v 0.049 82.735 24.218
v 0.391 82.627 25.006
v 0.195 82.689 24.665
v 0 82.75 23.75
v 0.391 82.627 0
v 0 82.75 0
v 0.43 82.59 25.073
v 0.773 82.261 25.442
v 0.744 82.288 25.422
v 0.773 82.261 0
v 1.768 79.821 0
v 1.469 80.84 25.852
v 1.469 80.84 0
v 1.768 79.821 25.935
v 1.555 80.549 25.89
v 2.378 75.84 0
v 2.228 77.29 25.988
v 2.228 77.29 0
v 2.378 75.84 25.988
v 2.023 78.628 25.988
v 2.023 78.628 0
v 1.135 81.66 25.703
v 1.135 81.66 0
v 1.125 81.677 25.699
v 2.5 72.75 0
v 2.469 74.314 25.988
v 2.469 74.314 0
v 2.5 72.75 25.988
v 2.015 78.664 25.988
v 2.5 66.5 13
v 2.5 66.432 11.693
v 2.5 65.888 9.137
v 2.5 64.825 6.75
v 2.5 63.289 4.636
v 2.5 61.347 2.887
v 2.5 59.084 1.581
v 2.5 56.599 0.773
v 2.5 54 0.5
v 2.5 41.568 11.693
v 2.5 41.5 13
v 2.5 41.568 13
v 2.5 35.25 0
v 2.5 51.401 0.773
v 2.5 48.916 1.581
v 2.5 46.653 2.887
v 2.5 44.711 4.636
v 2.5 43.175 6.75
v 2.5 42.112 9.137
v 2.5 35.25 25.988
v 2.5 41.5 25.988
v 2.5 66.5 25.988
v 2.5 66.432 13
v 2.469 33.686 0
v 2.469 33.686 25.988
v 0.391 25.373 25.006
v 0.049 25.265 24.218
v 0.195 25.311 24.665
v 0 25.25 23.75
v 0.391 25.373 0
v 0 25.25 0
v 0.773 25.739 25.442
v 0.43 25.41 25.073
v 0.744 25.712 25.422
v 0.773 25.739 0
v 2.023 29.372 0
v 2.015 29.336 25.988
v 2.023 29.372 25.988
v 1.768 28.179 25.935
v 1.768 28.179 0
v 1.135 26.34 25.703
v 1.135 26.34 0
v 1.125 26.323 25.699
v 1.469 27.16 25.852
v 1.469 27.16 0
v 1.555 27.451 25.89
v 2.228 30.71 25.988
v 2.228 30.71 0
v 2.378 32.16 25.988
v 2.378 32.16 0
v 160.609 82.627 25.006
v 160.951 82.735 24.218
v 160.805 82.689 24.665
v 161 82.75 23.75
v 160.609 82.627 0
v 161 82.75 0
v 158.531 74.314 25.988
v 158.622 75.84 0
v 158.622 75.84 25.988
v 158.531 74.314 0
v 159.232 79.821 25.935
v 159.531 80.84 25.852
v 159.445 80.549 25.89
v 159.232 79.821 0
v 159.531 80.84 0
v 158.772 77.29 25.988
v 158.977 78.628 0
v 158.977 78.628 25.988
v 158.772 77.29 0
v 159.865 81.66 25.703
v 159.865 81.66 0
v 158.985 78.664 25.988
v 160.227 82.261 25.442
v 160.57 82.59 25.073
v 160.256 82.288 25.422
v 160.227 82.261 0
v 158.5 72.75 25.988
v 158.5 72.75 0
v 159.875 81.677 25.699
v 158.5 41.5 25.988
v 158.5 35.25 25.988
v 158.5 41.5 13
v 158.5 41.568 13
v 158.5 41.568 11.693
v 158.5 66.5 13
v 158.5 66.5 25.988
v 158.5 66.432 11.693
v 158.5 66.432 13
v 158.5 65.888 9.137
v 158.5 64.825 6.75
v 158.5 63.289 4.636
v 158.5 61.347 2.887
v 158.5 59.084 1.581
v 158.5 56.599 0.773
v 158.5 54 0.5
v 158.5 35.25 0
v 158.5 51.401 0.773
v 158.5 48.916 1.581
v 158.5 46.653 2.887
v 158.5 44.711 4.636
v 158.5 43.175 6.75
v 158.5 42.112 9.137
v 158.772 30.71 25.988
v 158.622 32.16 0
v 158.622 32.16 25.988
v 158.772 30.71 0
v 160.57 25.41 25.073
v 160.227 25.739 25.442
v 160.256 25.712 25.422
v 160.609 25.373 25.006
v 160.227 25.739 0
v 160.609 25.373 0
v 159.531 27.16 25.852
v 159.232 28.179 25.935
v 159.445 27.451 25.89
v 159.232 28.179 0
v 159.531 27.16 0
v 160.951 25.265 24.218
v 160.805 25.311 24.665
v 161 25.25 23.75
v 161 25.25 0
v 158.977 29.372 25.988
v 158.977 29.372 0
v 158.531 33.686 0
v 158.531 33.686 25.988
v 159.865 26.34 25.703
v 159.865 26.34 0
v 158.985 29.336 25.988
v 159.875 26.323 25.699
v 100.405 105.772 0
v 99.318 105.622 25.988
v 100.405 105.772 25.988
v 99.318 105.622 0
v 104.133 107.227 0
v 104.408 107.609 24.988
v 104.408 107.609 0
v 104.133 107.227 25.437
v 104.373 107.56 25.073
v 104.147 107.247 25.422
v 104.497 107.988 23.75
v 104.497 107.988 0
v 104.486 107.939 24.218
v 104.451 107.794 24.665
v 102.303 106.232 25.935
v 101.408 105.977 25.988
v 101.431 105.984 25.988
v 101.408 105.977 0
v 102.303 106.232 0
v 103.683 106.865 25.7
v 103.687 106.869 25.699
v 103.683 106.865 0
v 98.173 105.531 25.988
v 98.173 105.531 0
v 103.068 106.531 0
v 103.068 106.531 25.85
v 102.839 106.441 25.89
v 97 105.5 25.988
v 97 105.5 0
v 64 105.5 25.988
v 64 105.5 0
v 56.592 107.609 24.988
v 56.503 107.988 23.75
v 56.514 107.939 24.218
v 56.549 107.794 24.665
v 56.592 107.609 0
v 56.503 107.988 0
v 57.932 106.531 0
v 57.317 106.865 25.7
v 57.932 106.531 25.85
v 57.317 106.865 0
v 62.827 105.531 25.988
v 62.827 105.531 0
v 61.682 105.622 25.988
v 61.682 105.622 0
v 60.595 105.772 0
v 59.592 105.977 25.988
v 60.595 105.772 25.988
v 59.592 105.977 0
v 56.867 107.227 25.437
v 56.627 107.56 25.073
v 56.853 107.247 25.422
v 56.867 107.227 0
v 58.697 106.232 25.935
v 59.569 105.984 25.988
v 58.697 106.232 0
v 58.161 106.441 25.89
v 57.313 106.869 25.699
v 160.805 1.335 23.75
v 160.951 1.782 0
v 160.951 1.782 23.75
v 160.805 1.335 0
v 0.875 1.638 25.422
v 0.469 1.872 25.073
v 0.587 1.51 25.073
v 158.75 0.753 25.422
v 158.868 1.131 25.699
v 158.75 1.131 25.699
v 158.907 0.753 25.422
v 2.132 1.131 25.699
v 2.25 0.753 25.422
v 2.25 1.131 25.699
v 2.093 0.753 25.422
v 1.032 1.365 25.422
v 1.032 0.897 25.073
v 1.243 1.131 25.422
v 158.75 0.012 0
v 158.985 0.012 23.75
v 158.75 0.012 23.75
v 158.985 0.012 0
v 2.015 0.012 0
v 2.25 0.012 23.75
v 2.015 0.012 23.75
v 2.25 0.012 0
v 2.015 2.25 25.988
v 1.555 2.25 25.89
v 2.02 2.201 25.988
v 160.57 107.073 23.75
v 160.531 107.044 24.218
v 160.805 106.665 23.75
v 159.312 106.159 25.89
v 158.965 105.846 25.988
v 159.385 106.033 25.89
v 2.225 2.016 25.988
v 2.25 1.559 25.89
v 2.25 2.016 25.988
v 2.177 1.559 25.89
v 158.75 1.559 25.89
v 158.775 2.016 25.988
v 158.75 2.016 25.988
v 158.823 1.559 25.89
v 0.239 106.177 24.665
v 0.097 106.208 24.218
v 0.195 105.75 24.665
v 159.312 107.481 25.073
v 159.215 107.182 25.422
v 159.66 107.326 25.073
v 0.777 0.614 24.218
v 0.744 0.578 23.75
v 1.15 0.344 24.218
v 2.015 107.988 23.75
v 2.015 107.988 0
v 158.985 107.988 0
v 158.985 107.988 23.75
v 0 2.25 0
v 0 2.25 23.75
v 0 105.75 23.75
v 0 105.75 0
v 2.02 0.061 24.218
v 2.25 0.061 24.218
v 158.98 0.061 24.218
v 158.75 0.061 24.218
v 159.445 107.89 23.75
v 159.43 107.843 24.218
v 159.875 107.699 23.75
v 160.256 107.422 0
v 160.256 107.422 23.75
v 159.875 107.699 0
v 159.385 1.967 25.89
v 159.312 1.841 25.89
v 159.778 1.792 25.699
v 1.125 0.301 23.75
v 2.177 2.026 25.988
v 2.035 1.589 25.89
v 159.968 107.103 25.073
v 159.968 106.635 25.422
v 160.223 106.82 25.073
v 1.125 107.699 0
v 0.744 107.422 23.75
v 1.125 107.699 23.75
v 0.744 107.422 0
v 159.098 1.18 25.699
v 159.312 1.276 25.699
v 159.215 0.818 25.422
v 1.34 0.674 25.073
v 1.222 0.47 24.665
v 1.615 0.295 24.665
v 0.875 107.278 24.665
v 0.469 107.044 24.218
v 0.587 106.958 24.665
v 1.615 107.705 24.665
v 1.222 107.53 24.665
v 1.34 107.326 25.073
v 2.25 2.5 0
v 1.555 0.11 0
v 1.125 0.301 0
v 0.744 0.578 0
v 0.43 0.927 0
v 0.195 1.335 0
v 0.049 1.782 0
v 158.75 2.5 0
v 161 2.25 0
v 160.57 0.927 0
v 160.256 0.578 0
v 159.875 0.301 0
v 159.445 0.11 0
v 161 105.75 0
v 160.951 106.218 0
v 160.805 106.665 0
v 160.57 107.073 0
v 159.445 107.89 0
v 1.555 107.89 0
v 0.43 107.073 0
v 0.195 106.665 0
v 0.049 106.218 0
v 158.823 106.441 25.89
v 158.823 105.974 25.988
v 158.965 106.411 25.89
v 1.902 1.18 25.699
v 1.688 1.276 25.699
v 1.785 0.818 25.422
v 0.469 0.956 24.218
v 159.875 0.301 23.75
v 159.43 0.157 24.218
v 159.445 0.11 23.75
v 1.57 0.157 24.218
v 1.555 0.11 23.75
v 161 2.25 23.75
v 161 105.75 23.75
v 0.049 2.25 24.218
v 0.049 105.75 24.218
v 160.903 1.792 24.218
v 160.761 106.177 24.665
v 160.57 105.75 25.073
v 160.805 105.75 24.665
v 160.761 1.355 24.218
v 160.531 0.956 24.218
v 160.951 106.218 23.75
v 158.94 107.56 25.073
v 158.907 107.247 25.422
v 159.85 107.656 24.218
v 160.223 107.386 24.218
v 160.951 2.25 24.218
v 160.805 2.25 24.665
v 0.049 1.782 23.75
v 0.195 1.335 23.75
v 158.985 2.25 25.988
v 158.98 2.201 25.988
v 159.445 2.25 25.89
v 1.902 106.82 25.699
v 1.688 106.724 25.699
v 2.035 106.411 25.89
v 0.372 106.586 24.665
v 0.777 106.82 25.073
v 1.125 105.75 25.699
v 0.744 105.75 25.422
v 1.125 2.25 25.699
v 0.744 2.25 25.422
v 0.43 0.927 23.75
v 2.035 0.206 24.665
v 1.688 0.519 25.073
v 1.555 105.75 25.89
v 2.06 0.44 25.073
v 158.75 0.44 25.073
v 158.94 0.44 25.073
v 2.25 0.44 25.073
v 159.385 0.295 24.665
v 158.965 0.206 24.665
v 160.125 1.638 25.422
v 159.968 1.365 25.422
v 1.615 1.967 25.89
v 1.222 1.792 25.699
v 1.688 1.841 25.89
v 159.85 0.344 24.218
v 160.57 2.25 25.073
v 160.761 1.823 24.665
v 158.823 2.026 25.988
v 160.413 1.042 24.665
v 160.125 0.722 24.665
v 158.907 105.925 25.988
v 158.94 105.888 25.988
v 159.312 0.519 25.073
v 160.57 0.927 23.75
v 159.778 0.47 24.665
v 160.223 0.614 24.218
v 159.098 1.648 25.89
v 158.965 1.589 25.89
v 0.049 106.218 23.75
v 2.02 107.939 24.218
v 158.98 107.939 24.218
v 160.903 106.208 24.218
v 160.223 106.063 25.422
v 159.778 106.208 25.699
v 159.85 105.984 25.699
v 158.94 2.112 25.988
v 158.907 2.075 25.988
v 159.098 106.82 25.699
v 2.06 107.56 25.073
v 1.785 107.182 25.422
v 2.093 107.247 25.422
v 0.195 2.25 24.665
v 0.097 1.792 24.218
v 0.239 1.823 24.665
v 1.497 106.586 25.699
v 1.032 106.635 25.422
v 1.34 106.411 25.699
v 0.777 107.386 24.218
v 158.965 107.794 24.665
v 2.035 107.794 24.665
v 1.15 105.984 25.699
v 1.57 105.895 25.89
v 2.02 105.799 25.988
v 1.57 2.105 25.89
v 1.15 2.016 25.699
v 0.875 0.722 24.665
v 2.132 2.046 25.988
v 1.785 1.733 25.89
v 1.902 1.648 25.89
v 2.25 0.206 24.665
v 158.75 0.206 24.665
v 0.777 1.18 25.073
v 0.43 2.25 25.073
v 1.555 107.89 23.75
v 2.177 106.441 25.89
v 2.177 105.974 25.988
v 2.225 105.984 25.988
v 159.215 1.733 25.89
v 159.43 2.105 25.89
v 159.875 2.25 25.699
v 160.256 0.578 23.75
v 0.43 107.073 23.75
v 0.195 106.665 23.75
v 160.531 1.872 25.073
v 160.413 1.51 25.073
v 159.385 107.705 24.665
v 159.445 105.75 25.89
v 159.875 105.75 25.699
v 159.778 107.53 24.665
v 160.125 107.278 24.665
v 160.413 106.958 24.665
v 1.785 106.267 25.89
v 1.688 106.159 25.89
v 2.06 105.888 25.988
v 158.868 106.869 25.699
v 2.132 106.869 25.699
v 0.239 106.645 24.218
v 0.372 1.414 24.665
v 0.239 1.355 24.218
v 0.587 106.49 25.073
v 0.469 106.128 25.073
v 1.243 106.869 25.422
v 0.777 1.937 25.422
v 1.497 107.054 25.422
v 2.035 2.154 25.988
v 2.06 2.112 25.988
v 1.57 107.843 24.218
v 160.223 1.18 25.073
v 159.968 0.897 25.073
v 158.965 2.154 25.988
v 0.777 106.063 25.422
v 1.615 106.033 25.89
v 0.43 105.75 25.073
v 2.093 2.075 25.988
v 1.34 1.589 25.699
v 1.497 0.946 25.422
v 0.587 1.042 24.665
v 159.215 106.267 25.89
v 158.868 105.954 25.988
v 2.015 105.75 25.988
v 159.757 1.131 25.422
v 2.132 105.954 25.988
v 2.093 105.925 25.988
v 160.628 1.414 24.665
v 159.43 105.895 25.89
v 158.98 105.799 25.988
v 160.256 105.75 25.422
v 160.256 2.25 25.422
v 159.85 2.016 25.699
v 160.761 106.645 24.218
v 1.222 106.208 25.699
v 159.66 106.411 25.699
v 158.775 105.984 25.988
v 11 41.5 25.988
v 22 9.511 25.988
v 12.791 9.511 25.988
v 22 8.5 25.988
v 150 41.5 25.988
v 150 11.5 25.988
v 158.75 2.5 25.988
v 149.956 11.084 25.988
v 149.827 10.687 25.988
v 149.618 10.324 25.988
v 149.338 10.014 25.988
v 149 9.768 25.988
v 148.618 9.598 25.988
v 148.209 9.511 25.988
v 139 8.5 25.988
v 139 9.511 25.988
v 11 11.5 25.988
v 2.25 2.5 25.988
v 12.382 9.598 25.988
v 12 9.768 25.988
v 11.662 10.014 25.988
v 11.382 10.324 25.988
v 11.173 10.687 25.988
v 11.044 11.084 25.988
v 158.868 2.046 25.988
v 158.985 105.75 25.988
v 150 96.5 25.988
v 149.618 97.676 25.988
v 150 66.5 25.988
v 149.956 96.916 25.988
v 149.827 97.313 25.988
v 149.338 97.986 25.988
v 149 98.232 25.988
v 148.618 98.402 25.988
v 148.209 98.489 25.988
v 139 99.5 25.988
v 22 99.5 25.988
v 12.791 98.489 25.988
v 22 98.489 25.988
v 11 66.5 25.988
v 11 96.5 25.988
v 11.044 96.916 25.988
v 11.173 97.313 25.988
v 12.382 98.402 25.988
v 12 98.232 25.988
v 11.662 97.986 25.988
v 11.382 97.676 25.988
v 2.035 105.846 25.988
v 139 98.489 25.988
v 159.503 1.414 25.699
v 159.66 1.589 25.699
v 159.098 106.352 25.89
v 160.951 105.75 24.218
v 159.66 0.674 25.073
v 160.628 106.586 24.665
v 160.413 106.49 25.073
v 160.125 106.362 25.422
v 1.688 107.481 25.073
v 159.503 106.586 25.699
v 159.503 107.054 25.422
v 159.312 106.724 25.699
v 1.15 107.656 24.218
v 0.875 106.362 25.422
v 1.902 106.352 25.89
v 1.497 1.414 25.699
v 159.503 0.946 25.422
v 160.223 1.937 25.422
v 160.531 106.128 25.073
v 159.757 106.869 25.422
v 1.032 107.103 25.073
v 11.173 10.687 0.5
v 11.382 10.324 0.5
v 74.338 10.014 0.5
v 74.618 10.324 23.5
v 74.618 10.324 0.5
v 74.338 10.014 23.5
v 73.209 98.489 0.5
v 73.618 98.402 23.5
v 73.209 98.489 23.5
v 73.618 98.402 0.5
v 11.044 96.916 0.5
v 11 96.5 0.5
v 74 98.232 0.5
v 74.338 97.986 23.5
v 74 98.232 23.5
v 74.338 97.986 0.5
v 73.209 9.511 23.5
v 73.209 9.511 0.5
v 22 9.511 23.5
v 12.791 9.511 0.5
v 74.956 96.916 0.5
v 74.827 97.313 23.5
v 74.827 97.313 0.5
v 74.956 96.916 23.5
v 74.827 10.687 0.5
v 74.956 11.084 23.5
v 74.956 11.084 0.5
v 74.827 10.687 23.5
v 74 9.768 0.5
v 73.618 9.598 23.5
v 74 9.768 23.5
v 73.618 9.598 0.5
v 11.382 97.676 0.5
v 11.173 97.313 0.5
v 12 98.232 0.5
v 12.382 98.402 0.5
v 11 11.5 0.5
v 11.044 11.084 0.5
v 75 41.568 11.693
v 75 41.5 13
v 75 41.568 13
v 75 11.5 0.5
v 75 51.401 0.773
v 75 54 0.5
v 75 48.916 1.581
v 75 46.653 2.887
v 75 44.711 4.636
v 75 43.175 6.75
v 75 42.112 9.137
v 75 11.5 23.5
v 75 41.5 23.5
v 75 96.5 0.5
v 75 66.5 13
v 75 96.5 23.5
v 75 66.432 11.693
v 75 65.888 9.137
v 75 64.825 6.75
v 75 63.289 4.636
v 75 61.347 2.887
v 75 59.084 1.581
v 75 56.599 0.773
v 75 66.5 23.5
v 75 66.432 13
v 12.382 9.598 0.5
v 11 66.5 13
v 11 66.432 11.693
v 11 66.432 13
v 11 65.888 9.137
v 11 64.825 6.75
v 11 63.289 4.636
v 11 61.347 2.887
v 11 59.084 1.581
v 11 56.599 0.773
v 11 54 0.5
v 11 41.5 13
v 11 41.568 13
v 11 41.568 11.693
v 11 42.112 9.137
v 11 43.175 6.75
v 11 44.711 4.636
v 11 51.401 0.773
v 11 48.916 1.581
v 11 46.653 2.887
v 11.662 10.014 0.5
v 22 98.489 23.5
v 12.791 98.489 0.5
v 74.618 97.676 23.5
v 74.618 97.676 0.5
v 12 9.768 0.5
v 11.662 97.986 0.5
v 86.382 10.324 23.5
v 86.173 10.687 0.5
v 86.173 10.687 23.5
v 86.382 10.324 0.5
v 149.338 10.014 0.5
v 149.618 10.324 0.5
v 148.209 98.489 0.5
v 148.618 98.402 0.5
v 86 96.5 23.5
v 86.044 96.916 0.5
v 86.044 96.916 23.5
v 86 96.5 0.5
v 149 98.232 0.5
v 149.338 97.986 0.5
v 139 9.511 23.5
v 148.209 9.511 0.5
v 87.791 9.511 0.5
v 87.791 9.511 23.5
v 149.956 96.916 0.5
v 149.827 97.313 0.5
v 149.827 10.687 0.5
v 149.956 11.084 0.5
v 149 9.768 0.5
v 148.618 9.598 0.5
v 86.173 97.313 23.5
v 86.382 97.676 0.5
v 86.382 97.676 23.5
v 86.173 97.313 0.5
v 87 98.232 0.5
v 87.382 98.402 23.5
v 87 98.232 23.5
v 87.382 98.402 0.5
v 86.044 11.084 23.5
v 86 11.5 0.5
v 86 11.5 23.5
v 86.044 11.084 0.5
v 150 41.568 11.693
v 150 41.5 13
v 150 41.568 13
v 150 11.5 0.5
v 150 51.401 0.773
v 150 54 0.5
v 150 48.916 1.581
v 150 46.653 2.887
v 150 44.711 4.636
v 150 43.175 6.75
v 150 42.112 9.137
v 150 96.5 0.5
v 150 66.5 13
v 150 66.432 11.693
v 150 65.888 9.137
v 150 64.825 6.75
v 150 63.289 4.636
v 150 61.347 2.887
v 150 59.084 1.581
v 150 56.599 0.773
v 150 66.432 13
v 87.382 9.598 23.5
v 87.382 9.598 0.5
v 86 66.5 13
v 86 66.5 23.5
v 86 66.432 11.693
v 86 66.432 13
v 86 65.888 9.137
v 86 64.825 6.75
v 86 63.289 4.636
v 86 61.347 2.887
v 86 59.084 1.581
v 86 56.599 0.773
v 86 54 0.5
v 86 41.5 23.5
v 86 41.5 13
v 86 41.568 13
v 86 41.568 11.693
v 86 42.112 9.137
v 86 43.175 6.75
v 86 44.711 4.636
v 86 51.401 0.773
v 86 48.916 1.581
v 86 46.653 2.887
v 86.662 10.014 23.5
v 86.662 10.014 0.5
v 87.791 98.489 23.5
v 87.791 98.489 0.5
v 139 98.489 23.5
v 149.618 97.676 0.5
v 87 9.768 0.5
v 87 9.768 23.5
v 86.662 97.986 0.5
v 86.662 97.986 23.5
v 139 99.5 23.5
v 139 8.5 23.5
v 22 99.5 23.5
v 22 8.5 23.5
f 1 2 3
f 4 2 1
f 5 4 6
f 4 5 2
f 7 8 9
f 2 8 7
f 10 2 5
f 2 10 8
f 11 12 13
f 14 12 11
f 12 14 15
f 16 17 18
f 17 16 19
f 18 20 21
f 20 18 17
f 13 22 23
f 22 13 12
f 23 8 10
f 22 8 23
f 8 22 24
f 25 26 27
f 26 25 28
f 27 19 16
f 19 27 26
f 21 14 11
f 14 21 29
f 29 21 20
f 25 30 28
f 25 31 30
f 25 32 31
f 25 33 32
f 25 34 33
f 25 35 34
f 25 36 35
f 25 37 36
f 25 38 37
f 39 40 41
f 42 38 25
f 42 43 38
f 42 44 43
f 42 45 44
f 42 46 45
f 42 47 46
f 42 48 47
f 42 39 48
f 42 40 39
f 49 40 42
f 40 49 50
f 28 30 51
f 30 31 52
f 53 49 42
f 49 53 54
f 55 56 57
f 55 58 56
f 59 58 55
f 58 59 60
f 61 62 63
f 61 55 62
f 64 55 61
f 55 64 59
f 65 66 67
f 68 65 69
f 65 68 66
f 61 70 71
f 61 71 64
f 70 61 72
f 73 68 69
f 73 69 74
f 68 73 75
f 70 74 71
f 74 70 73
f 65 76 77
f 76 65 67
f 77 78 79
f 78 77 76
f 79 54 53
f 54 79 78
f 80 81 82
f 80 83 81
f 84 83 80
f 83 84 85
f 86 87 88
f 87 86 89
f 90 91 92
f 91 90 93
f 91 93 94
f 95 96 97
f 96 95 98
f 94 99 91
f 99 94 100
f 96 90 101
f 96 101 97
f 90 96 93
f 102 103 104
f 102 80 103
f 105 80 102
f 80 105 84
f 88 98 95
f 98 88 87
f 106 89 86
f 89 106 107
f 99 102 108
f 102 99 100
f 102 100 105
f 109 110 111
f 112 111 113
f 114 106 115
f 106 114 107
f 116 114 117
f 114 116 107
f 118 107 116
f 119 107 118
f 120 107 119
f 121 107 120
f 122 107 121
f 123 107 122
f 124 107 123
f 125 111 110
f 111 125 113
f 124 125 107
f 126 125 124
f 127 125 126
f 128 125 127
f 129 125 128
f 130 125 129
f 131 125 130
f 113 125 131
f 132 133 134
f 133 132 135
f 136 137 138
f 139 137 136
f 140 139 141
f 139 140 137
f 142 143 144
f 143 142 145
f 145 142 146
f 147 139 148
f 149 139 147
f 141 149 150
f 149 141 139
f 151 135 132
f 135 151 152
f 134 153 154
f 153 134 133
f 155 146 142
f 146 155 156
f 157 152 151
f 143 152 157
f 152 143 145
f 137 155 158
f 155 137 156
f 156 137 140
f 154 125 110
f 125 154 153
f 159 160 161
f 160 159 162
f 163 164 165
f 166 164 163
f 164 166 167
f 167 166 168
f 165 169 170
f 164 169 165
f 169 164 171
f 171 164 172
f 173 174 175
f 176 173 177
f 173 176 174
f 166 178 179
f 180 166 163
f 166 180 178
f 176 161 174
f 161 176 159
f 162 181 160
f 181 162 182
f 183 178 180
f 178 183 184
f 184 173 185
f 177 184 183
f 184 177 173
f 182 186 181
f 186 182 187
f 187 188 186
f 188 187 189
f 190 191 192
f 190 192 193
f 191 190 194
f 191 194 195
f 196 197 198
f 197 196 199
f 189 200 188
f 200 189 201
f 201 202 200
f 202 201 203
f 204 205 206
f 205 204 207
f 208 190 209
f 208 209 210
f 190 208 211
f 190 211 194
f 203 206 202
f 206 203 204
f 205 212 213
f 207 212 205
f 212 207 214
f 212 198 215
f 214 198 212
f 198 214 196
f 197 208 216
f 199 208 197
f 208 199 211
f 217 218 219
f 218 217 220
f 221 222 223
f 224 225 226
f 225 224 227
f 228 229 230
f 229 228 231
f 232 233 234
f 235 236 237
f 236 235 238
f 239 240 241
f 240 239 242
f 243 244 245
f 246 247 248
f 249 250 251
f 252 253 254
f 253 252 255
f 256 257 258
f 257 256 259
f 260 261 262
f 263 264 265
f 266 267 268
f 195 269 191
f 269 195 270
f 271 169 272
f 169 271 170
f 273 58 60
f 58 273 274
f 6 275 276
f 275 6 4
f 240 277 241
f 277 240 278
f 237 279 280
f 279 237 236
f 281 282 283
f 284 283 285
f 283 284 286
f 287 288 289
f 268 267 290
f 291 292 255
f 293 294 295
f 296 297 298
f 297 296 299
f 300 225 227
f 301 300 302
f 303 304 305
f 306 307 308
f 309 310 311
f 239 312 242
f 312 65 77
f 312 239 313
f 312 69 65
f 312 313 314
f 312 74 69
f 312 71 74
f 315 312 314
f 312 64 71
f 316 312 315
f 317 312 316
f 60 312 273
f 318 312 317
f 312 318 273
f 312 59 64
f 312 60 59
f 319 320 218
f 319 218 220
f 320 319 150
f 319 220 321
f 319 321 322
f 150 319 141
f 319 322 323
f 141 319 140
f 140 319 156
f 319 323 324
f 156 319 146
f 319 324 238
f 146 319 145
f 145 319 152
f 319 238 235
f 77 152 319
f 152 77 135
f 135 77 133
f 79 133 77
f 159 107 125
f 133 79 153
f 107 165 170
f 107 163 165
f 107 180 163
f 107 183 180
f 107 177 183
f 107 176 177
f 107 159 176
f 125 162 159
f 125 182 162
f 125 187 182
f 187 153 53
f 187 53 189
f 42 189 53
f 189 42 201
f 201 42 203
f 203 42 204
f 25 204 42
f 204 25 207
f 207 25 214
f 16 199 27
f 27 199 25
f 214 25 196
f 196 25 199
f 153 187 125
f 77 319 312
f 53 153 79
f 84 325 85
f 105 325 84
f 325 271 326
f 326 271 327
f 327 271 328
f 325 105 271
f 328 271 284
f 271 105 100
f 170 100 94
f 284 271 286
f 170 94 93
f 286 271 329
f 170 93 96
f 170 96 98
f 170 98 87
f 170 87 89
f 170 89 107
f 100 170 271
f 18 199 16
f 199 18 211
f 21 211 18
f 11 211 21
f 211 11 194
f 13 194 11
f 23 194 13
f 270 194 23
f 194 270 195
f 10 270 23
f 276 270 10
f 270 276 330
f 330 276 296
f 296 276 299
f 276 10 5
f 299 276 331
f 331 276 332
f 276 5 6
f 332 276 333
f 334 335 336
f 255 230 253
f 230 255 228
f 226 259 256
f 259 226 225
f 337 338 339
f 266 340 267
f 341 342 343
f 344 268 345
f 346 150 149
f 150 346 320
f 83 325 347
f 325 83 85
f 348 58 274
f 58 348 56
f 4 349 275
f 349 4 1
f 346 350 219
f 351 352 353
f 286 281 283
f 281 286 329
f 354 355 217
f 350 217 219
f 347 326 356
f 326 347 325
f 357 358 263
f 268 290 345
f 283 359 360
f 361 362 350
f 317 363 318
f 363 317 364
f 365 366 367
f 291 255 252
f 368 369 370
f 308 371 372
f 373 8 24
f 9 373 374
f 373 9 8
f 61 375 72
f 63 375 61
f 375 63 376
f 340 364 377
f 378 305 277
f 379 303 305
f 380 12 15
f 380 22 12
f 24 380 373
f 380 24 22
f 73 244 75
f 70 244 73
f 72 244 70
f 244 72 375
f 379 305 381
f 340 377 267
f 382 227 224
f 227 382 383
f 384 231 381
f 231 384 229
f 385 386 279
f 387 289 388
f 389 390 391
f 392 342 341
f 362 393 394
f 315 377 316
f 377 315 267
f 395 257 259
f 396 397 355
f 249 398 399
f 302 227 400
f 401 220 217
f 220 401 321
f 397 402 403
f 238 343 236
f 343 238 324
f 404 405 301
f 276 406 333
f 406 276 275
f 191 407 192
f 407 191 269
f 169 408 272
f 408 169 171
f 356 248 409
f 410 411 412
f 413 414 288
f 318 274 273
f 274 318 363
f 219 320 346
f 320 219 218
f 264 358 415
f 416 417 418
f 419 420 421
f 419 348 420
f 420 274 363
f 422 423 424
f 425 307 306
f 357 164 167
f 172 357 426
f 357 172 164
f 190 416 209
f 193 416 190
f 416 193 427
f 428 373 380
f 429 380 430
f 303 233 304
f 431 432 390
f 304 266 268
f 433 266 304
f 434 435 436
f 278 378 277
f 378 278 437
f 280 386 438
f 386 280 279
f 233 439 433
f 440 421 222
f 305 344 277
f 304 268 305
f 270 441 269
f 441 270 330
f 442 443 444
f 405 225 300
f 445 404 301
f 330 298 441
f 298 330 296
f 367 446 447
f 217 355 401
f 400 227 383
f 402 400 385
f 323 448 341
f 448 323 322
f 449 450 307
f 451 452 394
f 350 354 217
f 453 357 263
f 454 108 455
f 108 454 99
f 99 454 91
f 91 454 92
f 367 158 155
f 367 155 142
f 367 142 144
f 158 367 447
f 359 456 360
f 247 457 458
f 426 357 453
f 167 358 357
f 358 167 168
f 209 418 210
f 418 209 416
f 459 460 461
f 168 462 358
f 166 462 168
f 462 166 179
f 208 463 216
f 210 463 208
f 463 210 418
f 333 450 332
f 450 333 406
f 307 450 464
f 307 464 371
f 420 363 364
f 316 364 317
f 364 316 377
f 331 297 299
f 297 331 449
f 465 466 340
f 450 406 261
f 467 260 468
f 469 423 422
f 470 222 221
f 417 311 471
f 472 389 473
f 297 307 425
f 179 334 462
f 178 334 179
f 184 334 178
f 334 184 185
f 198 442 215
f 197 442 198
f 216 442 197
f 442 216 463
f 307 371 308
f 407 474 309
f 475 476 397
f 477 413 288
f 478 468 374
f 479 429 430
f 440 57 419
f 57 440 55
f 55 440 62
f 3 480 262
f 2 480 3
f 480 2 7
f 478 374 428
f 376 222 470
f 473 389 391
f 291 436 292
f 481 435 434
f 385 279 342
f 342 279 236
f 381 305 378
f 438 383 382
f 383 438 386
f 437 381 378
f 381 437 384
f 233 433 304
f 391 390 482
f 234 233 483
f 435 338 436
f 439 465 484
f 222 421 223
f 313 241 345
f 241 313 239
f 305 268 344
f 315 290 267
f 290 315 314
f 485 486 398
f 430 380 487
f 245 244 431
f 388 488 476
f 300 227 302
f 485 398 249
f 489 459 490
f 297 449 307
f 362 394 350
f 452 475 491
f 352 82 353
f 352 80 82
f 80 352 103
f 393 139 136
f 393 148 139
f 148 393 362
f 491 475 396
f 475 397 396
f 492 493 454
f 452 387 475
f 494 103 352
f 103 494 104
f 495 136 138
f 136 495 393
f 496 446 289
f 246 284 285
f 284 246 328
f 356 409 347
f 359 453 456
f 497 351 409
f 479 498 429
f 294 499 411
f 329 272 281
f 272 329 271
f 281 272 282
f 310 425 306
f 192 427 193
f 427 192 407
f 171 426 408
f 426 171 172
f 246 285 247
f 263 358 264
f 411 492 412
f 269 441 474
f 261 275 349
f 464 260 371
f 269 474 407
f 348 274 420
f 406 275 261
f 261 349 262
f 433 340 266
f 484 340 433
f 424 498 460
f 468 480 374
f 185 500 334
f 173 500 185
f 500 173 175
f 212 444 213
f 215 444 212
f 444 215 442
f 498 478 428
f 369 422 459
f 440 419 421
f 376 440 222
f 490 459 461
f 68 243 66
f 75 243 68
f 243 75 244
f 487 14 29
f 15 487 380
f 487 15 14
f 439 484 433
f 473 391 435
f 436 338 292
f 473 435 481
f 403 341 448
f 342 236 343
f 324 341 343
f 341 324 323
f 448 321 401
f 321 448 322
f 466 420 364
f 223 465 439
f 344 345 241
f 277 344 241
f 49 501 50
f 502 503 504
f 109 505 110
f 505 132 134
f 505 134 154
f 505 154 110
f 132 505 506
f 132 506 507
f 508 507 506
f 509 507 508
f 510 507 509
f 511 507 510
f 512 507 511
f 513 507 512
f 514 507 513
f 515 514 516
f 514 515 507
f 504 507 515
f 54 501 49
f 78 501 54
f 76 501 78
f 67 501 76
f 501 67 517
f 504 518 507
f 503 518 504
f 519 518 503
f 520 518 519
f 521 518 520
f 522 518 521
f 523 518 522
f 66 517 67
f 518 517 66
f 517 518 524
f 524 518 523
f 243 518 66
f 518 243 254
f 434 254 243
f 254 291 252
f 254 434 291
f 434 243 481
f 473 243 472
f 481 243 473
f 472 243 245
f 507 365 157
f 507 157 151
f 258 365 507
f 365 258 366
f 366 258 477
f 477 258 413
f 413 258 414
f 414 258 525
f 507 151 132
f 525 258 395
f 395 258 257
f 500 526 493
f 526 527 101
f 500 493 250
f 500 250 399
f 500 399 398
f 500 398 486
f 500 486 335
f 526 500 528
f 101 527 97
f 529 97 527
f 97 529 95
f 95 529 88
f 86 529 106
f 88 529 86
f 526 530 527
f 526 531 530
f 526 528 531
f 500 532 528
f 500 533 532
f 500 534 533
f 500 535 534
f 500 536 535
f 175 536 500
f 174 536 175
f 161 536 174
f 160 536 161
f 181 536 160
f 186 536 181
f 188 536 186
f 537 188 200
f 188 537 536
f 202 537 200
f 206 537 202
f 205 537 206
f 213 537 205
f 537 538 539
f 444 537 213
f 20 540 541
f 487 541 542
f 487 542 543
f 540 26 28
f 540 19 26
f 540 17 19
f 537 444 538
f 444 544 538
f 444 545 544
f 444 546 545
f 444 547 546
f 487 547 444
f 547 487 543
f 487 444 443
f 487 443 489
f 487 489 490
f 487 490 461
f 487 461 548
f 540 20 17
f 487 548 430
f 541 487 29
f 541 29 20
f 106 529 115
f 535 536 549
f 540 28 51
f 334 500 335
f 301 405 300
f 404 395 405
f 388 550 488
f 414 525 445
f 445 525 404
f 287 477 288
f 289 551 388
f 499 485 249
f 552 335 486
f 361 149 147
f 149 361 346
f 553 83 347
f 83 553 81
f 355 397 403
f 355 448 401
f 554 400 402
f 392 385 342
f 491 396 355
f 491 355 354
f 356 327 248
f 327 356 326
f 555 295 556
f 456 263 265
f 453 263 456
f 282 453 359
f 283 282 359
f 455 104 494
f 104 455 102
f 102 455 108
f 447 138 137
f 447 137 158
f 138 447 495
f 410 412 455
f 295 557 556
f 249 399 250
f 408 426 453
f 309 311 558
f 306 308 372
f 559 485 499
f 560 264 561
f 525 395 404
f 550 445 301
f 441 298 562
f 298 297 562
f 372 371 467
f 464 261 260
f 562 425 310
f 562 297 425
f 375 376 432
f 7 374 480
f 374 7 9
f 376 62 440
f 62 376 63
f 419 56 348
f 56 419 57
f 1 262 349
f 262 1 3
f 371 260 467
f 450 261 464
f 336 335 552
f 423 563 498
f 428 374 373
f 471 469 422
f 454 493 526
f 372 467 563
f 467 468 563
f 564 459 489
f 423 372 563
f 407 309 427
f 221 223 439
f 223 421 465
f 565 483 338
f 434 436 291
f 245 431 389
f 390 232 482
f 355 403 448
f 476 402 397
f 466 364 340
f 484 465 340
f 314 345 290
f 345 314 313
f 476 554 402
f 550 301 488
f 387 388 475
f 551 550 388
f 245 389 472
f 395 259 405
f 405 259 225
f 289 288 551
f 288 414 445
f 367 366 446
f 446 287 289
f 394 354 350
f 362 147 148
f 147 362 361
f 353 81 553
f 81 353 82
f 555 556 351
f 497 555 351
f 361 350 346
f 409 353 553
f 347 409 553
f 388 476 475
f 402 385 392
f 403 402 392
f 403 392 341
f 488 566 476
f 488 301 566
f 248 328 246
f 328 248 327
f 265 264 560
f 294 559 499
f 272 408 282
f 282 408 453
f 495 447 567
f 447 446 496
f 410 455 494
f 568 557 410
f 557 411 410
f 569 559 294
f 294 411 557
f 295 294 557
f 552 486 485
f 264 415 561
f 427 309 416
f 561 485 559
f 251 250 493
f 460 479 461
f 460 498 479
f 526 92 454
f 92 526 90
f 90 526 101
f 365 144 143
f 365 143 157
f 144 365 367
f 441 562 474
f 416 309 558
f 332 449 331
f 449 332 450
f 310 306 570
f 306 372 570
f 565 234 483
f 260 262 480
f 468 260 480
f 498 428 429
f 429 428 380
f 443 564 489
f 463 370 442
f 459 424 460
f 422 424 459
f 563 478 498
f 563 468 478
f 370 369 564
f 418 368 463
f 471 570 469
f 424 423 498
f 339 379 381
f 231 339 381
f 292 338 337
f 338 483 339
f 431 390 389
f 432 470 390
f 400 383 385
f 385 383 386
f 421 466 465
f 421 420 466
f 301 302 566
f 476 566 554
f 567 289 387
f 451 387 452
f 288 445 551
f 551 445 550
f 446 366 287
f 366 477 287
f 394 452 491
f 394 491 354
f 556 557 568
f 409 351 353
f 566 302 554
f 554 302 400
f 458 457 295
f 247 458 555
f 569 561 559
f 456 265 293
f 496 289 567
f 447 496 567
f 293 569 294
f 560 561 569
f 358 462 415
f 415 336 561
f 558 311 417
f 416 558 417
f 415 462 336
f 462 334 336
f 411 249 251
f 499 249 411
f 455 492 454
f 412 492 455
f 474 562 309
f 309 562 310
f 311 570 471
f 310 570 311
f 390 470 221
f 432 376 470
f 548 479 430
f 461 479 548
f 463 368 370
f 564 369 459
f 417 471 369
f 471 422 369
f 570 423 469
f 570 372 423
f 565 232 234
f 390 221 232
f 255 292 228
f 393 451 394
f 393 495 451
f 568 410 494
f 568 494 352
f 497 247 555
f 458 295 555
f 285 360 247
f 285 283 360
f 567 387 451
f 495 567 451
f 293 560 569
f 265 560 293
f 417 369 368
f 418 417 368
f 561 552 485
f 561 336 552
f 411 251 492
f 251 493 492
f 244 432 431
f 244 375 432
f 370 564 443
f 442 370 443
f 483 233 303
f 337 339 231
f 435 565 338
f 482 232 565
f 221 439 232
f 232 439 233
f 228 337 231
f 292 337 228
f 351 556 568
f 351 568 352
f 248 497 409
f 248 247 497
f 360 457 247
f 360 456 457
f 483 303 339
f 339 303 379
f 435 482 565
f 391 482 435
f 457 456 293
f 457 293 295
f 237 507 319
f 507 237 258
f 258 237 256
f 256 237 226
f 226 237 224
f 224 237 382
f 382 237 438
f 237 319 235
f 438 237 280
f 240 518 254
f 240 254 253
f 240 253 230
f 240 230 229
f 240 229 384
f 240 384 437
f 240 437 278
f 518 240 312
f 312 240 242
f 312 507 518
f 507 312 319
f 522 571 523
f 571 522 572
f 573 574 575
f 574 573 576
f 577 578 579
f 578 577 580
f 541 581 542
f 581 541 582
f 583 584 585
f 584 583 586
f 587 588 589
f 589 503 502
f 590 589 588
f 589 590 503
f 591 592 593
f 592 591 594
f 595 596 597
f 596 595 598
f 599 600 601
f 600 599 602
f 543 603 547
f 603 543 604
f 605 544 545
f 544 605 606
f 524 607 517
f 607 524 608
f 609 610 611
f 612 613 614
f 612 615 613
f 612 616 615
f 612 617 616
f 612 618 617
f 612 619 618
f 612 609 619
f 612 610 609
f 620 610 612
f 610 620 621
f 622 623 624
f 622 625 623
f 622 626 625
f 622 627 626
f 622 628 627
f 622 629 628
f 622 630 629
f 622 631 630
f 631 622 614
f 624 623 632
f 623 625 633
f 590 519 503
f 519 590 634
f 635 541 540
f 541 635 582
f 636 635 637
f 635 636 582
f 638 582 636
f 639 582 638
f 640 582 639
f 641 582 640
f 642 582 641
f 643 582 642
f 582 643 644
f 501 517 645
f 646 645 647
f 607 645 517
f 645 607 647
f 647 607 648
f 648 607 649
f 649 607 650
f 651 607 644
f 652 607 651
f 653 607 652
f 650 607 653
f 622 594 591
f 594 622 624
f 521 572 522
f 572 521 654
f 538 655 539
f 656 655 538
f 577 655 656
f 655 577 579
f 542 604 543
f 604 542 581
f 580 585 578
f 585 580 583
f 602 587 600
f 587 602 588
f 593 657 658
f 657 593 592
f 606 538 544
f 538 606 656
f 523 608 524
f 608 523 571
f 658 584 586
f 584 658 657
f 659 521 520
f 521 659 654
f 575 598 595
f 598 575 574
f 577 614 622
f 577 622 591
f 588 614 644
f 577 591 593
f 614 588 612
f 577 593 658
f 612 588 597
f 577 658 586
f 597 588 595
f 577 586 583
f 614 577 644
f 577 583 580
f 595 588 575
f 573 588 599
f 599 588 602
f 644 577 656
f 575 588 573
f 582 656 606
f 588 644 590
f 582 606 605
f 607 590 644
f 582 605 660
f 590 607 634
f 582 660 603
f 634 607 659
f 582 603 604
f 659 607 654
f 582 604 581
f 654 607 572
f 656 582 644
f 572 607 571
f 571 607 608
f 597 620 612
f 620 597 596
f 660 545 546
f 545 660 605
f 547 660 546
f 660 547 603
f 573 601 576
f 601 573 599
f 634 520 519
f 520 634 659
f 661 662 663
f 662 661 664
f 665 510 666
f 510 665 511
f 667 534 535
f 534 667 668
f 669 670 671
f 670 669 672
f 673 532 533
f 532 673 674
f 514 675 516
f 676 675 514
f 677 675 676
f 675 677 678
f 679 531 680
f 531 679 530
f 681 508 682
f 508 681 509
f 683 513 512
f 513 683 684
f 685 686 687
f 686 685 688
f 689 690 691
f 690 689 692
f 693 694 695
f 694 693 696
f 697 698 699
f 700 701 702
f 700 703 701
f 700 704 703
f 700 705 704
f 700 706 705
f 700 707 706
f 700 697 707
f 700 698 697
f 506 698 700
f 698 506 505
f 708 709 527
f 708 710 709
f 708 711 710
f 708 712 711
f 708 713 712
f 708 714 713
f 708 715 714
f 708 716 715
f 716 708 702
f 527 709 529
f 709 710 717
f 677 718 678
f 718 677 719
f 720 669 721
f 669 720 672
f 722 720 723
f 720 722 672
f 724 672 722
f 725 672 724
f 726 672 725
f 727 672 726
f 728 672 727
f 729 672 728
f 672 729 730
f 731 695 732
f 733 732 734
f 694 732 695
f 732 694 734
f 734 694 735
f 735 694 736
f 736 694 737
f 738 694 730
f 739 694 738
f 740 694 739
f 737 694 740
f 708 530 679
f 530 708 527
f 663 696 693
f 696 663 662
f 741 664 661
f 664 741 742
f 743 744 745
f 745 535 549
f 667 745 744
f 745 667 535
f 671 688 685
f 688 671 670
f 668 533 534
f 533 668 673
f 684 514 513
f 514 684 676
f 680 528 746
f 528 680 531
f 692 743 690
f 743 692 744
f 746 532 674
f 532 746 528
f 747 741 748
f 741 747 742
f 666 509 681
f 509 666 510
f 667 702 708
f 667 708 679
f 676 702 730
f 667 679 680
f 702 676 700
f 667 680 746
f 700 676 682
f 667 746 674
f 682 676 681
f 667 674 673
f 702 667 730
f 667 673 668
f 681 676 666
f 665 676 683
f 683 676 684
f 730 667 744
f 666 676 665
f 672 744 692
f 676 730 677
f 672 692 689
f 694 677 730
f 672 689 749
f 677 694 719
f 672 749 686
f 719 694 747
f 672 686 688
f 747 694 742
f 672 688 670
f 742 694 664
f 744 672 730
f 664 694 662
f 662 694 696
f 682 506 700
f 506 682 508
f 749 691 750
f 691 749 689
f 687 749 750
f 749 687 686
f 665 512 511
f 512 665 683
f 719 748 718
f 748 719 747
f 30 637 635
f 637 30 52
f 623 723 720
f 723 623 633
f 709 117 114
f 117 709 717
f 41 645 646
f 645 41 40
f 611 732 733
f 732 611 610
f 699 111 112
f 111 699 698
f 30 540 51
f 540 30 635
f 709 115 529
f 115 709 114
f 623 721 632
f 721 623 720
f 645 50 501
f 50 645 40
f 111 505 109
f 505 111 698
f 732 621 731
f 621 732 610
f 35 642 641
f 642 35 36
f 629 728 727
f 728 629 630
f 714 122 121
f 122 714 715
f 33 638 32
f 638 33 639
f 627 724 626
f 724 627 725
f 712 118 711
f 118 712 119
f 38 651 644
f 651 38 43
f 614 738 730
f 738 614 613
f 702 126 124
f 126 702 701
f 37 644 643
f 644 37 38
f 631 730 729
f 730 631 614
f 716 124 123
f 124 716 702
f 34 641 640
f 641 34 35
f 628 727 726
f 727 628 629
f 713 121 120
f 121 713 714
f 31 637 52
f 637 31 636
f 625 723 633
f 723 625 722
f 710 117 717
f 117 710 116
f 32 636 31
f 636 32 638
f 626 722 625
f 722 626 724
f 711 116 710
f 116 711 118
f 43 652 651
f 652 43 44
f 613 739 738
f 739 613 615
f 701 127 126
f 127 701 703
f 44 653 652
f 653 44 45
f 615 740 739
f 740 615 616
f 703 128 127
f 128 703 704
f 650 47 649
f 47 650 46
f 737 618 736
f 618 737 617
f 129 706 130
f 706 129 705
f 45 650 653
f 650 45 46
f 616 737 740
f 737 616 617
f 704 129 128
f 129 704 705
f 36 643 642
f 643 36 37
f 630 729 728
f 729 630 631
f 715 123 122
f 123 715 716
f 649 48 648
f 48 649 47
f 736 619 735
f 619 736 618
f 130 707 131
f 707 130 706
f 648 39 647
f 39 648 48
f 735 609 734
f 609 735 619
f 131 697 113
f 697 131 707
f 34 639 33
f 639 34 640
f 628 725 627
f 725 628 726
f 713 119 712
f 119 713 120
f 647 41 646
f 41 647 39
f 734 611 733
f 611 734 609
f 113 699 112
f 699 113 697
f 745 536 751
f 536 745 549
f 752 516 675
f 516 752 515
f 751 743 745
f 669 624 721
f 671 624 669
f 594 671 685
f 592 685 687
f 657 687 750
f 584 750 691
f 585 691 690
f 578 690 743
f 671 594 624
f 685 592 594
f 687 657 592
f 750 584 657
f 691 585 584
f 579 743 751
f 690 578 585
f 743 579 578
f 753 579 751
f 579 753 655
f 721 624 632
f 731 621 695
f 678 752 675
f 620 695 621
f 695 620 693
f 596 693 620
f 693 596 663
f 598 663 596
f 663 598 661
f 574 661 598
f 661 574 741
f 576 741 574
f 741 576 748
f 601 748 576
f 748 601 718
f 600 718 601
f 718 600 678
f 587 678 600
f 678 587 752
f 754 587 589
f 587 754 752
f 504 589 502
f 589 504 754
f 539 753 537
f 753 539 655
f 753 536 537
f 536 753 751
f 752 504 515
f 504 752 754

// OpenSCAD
// file: ../roundedcube.scad
// Aquired from https://danielupshaw.com/openscad-rounded-corners/
// License unknown

// Higher definition curves
$fs = 0.01;

module roundedcube(size = [1, 1, 1], center = false, radius = 0.5, apply_to = "all") {
	// If single value, convert to [x, y, z] vector
	size = (size[0] == undef) ? [size, size, size] : size;

	translate_min = radius;
	translate_xmax = size[0] - radius;
	translate_ymax = size[1] - radius;
	translate_zmax = size[2] - radius;

	diameter = radius * 2;

	module build_point(type = "sphere", rotate = [0, 0, 0]) {
		if (type == "sphere") {
			sphere(r = radius);
		} else if (type == "cylinder") {
			rotate(a = rotate)
			cylinder(h = diameter, r = radius, center = true);
		}
	}

	obj_translate = (center == false) ?
		[0, 0, 0] : [
			-(size[0] / 2),
			-(size[1] / 2),
			-(size[2] / 2)
		];

	translate(v = obj_translate) {
		hull() {
			for (translate_x = [translate_min, translate_xmax]) {
				x_at = (translate_x == translate_min) ? "min" : "max";
				for (translate_y = [translate_min, translate_ymax]) {
					y_at = (translate_y == translate_min) ? "min" : "max";
					for (translate_z = [translate_min, translate_zmax]) {
						z_at = (translate_z == translate_min) ? "min" : "max";

						translate(v = [translate_x, translate_y, translate_z])
						if (
							(apply_to == "all") ||
							(apply_to == "xmin" && x_at == "min") || (apply_to == "xmax" && x_at == "max") ||
							(apply_to == "ymin" && y_at == "min") || (apply_to == "ymax" && y_at == "max") ||
							(apply_to == "zmin" && z_at == "min") || (apply_to == "zmax" && z_at == "max")
						) {
							build_point("sphere");
						} else {
							rotate =
								(apply_to == "xmin" || apply_to == "xmax" || apply_to == "x") ? [0, 90, 0] : (
								(apply_to == "ymin" || apply_to == "ymax" || apply_to == "y") ? [90, 90, 0] :
								[0, 0, 0]
							);
							build_point("cylinder", rotate);
						}
					}
				}
			}
		}
	}
}
// file: ../photo_base.scad
use <./roundedcube.scad>

BOX_WIDTH = 161;
BOX_DEPTH = 108;
BOX_HEIGHT = 26;

BOX_RADIUS = 2.25;

LABEL_WIDTH = BOX_WIDTH - BOX_RADIUS * 2;
LABEL_DEPTH = 2.5;

SIDE_CURVE_DEPTH = 20;
SIDE_CURVE_DIAMETER = 5;
SIDE_INNER_DEPTH = 37.5;

// total = 48.5
TOP_CURVE_WIDTH = 15;
TOP_CURVE_DIAMETER = 5;
TOP_INNER_WIDTH = 33;

render_helper = 1; // Helps the quick render not have a "skin" on top of the hole

function box_width() = BOX_WIDTH;
function box_depth() = BOX_DEPTH;
function box_height() = BOX_HEIGHT;
function center_width_offset(width) = (BOX_WIDTH - width) / 2;
function triple_width_offset(width) = (BOX_WIDTH - width * 2) / 3;
function center_depth_offset(depth) = (BOX_DEPTH - depth) / 2;
function triple_depth_offset(depth) = (BOX_DEPTH - depth) / 3;

module base_block() {
    roundedcube(
        [BOX_WIDTH, BOX_DEPTH, BOX_HEIGHT],
        radius = BOX_RADIUS,
        apply_to = "zmax"
    );
}

module label_cutout() {
    offset_x = (BOX_WIDTH - LABEL_WIDTH) / 2;
    translate([offset_x, -render_helper, -render_helper])
    cube([LABEL_WIDTH, LABEL_DEPTH + render_helper, BOX_HEIGHT + render_helper * 2]);
}

module side_cutout() {
    height = BOX_HEIGHT + render_helper * 2;
    half_side = SIDE_INNER_DEPTH / 2;
    
    translate([0, half_side, -render_helper])
    linear_extrude(height)
    resize([SIDE_CURVE_DIAMETER, SIDE_CURVE_DEPTH])
    circle(SIDE_CURVE_DIAMETER, $fn = 40);
    
    translate([-SIDE_CURVE_DIAMETER / 2, -half_side, -render_helper])
    cube([SIDE_CURVE_DIAMETER, SIDE_INNER_DEPTH, height]);
    
    translate([0, -half_side, -render_helper])
    linear_extrude(height)
    resize([SIDE_CURVE_DIAMETER, SIDE_CURVE_DEPTH])
    circle(SIDE_CURVE_DIAMETER, $fn = 40);
}

module side_cutouts() {
    translate([0, BOX_DEPTH / 2, 0])
    side_cutout();
    
    translate([BOX_WIDTH, BOX_DEPTH / 2, 0])
    side_cutout();
}

module top_cutout() {
    height = BOX_HEIGHT + render_helper * 2;
    half_side = TOP_INNER_WIDTH / 2;
    
    translate([BOX_WIDTH / 2, BOX_DEPTH, 0])
    union() {
        translate([half_side, 0, -render_helper])
        linear_extrude(height)
        rotate([0, 0, 90])
        resize([TOP_CURVE_DIAMETER, TOP_CURVE_WIDTH])
        circle(TOP_CURVE_DIAMETER, $fn = 40);
        
        translate([-half_side, -TOP_CURVE_DIAMETER / 2, -render_helper])
        cube([TOP_INNER_WIDTH, TOP_CURVE_DIAMETER, height]);
        
        translate([-half_side, 0, -render_helper])
        linear_extrude(height)
        rotate([0, 0, 90])
        resize([TOP_CURVE_DIAMETER, TOP_CURVE_WIDTH])
        circle(TOP_CURVE_DIAMETER, $fn = 40);
    }
}

module photo_base() {
    difference() {
        base_block();
        label_cutout();
        side_cutouts();
        top_cutout();
    }
}

photo_base();
// file: ../utilities.scad
use <./photo_base.scad>
use <./roundedcube.scad>

render_helper = 1; // Helps the quick render not have a "skin" on top of the hole
THUMB_WIDTH = 25;

module card_slot(
    width = 63.5,
    depth = 88.5,
    height = 17,
    radius = 2
) {
    roundedcube(
        [width, depth, height + render_helper],
        radius = radius,
        apply_to = "z"
    );
}

module thumb_slot(
    width = box_width(),
    depth = THUMB_WIDTH,
    height = box_height(),
    slot_depth = undef
) {
    
    translate_y = slot_depth == undef ? 0 : slot_depth / 2 - THUMB_WIDTH / 2;
    
    translate([0, translate_y, 0])
    union() {
        translate([0, 0, depth / 2])
        cube([width, depth, height - depth / 2 + render_helper]);
        
        translate([0, depth / 2, depth / 2])
        rotate([0, 90, 0])
        cylinder(h = width, d = depth);
    }
}

module booklet_slot(width, depth, height) {
    cube([width, depth, height + render_helper]);
}

module two_card_holder(
    width = 63.5,
    depth = 88.5,
    height = 17,
    radius = 2,
    booklet = undef
) {
    total_height = booklet == undef ? height : height + booklet[2];
    
    difference() {
        photo_base();
        
        offset_z = booklet == undef ? box_height() - height : box_height() - total_height;
        translate([0, center_depth_offset(depth), offset_z])
        union() {
            translate([triple_width_offset(width), 0, 0])
            card_slot(width, depth, total_height, radius);
            
            translate([triple_width_offset(width) * 2 + width, 0, 0])
            card_slot(width, depth, total_height, radius);
        }
        
        translate([0, center_depth_offset(THUMB_WIDTH), box_height() - total_height])
        thumb_slot(height = total_height);
        
        if (booklet != undef) {
            translate([center_width_offset(booklet[0]), center_depth_offset(booklet[1]), box_height() - booklet[2]])
            booklet_slot(booklet[0], booklet[1], booklet[2]);
        }
    }
}
// main file
use <../utilities.scad>

CARD_WIDTH = 64;
CARD_DEPTH = 89;
CARD_HEIGHT = 23;

BOOKLET_WIDTH = 117;
BOOKLET_DEPTH = 91;
BOOKLET_HEIGHT = 2.5;

booklet = [117, 91, 2.5];

two_card_holder(
    CARD_WIDTH,
    CARD_DEPTH,
    CARD_HEIGHT,
    booklet = booklet
);
